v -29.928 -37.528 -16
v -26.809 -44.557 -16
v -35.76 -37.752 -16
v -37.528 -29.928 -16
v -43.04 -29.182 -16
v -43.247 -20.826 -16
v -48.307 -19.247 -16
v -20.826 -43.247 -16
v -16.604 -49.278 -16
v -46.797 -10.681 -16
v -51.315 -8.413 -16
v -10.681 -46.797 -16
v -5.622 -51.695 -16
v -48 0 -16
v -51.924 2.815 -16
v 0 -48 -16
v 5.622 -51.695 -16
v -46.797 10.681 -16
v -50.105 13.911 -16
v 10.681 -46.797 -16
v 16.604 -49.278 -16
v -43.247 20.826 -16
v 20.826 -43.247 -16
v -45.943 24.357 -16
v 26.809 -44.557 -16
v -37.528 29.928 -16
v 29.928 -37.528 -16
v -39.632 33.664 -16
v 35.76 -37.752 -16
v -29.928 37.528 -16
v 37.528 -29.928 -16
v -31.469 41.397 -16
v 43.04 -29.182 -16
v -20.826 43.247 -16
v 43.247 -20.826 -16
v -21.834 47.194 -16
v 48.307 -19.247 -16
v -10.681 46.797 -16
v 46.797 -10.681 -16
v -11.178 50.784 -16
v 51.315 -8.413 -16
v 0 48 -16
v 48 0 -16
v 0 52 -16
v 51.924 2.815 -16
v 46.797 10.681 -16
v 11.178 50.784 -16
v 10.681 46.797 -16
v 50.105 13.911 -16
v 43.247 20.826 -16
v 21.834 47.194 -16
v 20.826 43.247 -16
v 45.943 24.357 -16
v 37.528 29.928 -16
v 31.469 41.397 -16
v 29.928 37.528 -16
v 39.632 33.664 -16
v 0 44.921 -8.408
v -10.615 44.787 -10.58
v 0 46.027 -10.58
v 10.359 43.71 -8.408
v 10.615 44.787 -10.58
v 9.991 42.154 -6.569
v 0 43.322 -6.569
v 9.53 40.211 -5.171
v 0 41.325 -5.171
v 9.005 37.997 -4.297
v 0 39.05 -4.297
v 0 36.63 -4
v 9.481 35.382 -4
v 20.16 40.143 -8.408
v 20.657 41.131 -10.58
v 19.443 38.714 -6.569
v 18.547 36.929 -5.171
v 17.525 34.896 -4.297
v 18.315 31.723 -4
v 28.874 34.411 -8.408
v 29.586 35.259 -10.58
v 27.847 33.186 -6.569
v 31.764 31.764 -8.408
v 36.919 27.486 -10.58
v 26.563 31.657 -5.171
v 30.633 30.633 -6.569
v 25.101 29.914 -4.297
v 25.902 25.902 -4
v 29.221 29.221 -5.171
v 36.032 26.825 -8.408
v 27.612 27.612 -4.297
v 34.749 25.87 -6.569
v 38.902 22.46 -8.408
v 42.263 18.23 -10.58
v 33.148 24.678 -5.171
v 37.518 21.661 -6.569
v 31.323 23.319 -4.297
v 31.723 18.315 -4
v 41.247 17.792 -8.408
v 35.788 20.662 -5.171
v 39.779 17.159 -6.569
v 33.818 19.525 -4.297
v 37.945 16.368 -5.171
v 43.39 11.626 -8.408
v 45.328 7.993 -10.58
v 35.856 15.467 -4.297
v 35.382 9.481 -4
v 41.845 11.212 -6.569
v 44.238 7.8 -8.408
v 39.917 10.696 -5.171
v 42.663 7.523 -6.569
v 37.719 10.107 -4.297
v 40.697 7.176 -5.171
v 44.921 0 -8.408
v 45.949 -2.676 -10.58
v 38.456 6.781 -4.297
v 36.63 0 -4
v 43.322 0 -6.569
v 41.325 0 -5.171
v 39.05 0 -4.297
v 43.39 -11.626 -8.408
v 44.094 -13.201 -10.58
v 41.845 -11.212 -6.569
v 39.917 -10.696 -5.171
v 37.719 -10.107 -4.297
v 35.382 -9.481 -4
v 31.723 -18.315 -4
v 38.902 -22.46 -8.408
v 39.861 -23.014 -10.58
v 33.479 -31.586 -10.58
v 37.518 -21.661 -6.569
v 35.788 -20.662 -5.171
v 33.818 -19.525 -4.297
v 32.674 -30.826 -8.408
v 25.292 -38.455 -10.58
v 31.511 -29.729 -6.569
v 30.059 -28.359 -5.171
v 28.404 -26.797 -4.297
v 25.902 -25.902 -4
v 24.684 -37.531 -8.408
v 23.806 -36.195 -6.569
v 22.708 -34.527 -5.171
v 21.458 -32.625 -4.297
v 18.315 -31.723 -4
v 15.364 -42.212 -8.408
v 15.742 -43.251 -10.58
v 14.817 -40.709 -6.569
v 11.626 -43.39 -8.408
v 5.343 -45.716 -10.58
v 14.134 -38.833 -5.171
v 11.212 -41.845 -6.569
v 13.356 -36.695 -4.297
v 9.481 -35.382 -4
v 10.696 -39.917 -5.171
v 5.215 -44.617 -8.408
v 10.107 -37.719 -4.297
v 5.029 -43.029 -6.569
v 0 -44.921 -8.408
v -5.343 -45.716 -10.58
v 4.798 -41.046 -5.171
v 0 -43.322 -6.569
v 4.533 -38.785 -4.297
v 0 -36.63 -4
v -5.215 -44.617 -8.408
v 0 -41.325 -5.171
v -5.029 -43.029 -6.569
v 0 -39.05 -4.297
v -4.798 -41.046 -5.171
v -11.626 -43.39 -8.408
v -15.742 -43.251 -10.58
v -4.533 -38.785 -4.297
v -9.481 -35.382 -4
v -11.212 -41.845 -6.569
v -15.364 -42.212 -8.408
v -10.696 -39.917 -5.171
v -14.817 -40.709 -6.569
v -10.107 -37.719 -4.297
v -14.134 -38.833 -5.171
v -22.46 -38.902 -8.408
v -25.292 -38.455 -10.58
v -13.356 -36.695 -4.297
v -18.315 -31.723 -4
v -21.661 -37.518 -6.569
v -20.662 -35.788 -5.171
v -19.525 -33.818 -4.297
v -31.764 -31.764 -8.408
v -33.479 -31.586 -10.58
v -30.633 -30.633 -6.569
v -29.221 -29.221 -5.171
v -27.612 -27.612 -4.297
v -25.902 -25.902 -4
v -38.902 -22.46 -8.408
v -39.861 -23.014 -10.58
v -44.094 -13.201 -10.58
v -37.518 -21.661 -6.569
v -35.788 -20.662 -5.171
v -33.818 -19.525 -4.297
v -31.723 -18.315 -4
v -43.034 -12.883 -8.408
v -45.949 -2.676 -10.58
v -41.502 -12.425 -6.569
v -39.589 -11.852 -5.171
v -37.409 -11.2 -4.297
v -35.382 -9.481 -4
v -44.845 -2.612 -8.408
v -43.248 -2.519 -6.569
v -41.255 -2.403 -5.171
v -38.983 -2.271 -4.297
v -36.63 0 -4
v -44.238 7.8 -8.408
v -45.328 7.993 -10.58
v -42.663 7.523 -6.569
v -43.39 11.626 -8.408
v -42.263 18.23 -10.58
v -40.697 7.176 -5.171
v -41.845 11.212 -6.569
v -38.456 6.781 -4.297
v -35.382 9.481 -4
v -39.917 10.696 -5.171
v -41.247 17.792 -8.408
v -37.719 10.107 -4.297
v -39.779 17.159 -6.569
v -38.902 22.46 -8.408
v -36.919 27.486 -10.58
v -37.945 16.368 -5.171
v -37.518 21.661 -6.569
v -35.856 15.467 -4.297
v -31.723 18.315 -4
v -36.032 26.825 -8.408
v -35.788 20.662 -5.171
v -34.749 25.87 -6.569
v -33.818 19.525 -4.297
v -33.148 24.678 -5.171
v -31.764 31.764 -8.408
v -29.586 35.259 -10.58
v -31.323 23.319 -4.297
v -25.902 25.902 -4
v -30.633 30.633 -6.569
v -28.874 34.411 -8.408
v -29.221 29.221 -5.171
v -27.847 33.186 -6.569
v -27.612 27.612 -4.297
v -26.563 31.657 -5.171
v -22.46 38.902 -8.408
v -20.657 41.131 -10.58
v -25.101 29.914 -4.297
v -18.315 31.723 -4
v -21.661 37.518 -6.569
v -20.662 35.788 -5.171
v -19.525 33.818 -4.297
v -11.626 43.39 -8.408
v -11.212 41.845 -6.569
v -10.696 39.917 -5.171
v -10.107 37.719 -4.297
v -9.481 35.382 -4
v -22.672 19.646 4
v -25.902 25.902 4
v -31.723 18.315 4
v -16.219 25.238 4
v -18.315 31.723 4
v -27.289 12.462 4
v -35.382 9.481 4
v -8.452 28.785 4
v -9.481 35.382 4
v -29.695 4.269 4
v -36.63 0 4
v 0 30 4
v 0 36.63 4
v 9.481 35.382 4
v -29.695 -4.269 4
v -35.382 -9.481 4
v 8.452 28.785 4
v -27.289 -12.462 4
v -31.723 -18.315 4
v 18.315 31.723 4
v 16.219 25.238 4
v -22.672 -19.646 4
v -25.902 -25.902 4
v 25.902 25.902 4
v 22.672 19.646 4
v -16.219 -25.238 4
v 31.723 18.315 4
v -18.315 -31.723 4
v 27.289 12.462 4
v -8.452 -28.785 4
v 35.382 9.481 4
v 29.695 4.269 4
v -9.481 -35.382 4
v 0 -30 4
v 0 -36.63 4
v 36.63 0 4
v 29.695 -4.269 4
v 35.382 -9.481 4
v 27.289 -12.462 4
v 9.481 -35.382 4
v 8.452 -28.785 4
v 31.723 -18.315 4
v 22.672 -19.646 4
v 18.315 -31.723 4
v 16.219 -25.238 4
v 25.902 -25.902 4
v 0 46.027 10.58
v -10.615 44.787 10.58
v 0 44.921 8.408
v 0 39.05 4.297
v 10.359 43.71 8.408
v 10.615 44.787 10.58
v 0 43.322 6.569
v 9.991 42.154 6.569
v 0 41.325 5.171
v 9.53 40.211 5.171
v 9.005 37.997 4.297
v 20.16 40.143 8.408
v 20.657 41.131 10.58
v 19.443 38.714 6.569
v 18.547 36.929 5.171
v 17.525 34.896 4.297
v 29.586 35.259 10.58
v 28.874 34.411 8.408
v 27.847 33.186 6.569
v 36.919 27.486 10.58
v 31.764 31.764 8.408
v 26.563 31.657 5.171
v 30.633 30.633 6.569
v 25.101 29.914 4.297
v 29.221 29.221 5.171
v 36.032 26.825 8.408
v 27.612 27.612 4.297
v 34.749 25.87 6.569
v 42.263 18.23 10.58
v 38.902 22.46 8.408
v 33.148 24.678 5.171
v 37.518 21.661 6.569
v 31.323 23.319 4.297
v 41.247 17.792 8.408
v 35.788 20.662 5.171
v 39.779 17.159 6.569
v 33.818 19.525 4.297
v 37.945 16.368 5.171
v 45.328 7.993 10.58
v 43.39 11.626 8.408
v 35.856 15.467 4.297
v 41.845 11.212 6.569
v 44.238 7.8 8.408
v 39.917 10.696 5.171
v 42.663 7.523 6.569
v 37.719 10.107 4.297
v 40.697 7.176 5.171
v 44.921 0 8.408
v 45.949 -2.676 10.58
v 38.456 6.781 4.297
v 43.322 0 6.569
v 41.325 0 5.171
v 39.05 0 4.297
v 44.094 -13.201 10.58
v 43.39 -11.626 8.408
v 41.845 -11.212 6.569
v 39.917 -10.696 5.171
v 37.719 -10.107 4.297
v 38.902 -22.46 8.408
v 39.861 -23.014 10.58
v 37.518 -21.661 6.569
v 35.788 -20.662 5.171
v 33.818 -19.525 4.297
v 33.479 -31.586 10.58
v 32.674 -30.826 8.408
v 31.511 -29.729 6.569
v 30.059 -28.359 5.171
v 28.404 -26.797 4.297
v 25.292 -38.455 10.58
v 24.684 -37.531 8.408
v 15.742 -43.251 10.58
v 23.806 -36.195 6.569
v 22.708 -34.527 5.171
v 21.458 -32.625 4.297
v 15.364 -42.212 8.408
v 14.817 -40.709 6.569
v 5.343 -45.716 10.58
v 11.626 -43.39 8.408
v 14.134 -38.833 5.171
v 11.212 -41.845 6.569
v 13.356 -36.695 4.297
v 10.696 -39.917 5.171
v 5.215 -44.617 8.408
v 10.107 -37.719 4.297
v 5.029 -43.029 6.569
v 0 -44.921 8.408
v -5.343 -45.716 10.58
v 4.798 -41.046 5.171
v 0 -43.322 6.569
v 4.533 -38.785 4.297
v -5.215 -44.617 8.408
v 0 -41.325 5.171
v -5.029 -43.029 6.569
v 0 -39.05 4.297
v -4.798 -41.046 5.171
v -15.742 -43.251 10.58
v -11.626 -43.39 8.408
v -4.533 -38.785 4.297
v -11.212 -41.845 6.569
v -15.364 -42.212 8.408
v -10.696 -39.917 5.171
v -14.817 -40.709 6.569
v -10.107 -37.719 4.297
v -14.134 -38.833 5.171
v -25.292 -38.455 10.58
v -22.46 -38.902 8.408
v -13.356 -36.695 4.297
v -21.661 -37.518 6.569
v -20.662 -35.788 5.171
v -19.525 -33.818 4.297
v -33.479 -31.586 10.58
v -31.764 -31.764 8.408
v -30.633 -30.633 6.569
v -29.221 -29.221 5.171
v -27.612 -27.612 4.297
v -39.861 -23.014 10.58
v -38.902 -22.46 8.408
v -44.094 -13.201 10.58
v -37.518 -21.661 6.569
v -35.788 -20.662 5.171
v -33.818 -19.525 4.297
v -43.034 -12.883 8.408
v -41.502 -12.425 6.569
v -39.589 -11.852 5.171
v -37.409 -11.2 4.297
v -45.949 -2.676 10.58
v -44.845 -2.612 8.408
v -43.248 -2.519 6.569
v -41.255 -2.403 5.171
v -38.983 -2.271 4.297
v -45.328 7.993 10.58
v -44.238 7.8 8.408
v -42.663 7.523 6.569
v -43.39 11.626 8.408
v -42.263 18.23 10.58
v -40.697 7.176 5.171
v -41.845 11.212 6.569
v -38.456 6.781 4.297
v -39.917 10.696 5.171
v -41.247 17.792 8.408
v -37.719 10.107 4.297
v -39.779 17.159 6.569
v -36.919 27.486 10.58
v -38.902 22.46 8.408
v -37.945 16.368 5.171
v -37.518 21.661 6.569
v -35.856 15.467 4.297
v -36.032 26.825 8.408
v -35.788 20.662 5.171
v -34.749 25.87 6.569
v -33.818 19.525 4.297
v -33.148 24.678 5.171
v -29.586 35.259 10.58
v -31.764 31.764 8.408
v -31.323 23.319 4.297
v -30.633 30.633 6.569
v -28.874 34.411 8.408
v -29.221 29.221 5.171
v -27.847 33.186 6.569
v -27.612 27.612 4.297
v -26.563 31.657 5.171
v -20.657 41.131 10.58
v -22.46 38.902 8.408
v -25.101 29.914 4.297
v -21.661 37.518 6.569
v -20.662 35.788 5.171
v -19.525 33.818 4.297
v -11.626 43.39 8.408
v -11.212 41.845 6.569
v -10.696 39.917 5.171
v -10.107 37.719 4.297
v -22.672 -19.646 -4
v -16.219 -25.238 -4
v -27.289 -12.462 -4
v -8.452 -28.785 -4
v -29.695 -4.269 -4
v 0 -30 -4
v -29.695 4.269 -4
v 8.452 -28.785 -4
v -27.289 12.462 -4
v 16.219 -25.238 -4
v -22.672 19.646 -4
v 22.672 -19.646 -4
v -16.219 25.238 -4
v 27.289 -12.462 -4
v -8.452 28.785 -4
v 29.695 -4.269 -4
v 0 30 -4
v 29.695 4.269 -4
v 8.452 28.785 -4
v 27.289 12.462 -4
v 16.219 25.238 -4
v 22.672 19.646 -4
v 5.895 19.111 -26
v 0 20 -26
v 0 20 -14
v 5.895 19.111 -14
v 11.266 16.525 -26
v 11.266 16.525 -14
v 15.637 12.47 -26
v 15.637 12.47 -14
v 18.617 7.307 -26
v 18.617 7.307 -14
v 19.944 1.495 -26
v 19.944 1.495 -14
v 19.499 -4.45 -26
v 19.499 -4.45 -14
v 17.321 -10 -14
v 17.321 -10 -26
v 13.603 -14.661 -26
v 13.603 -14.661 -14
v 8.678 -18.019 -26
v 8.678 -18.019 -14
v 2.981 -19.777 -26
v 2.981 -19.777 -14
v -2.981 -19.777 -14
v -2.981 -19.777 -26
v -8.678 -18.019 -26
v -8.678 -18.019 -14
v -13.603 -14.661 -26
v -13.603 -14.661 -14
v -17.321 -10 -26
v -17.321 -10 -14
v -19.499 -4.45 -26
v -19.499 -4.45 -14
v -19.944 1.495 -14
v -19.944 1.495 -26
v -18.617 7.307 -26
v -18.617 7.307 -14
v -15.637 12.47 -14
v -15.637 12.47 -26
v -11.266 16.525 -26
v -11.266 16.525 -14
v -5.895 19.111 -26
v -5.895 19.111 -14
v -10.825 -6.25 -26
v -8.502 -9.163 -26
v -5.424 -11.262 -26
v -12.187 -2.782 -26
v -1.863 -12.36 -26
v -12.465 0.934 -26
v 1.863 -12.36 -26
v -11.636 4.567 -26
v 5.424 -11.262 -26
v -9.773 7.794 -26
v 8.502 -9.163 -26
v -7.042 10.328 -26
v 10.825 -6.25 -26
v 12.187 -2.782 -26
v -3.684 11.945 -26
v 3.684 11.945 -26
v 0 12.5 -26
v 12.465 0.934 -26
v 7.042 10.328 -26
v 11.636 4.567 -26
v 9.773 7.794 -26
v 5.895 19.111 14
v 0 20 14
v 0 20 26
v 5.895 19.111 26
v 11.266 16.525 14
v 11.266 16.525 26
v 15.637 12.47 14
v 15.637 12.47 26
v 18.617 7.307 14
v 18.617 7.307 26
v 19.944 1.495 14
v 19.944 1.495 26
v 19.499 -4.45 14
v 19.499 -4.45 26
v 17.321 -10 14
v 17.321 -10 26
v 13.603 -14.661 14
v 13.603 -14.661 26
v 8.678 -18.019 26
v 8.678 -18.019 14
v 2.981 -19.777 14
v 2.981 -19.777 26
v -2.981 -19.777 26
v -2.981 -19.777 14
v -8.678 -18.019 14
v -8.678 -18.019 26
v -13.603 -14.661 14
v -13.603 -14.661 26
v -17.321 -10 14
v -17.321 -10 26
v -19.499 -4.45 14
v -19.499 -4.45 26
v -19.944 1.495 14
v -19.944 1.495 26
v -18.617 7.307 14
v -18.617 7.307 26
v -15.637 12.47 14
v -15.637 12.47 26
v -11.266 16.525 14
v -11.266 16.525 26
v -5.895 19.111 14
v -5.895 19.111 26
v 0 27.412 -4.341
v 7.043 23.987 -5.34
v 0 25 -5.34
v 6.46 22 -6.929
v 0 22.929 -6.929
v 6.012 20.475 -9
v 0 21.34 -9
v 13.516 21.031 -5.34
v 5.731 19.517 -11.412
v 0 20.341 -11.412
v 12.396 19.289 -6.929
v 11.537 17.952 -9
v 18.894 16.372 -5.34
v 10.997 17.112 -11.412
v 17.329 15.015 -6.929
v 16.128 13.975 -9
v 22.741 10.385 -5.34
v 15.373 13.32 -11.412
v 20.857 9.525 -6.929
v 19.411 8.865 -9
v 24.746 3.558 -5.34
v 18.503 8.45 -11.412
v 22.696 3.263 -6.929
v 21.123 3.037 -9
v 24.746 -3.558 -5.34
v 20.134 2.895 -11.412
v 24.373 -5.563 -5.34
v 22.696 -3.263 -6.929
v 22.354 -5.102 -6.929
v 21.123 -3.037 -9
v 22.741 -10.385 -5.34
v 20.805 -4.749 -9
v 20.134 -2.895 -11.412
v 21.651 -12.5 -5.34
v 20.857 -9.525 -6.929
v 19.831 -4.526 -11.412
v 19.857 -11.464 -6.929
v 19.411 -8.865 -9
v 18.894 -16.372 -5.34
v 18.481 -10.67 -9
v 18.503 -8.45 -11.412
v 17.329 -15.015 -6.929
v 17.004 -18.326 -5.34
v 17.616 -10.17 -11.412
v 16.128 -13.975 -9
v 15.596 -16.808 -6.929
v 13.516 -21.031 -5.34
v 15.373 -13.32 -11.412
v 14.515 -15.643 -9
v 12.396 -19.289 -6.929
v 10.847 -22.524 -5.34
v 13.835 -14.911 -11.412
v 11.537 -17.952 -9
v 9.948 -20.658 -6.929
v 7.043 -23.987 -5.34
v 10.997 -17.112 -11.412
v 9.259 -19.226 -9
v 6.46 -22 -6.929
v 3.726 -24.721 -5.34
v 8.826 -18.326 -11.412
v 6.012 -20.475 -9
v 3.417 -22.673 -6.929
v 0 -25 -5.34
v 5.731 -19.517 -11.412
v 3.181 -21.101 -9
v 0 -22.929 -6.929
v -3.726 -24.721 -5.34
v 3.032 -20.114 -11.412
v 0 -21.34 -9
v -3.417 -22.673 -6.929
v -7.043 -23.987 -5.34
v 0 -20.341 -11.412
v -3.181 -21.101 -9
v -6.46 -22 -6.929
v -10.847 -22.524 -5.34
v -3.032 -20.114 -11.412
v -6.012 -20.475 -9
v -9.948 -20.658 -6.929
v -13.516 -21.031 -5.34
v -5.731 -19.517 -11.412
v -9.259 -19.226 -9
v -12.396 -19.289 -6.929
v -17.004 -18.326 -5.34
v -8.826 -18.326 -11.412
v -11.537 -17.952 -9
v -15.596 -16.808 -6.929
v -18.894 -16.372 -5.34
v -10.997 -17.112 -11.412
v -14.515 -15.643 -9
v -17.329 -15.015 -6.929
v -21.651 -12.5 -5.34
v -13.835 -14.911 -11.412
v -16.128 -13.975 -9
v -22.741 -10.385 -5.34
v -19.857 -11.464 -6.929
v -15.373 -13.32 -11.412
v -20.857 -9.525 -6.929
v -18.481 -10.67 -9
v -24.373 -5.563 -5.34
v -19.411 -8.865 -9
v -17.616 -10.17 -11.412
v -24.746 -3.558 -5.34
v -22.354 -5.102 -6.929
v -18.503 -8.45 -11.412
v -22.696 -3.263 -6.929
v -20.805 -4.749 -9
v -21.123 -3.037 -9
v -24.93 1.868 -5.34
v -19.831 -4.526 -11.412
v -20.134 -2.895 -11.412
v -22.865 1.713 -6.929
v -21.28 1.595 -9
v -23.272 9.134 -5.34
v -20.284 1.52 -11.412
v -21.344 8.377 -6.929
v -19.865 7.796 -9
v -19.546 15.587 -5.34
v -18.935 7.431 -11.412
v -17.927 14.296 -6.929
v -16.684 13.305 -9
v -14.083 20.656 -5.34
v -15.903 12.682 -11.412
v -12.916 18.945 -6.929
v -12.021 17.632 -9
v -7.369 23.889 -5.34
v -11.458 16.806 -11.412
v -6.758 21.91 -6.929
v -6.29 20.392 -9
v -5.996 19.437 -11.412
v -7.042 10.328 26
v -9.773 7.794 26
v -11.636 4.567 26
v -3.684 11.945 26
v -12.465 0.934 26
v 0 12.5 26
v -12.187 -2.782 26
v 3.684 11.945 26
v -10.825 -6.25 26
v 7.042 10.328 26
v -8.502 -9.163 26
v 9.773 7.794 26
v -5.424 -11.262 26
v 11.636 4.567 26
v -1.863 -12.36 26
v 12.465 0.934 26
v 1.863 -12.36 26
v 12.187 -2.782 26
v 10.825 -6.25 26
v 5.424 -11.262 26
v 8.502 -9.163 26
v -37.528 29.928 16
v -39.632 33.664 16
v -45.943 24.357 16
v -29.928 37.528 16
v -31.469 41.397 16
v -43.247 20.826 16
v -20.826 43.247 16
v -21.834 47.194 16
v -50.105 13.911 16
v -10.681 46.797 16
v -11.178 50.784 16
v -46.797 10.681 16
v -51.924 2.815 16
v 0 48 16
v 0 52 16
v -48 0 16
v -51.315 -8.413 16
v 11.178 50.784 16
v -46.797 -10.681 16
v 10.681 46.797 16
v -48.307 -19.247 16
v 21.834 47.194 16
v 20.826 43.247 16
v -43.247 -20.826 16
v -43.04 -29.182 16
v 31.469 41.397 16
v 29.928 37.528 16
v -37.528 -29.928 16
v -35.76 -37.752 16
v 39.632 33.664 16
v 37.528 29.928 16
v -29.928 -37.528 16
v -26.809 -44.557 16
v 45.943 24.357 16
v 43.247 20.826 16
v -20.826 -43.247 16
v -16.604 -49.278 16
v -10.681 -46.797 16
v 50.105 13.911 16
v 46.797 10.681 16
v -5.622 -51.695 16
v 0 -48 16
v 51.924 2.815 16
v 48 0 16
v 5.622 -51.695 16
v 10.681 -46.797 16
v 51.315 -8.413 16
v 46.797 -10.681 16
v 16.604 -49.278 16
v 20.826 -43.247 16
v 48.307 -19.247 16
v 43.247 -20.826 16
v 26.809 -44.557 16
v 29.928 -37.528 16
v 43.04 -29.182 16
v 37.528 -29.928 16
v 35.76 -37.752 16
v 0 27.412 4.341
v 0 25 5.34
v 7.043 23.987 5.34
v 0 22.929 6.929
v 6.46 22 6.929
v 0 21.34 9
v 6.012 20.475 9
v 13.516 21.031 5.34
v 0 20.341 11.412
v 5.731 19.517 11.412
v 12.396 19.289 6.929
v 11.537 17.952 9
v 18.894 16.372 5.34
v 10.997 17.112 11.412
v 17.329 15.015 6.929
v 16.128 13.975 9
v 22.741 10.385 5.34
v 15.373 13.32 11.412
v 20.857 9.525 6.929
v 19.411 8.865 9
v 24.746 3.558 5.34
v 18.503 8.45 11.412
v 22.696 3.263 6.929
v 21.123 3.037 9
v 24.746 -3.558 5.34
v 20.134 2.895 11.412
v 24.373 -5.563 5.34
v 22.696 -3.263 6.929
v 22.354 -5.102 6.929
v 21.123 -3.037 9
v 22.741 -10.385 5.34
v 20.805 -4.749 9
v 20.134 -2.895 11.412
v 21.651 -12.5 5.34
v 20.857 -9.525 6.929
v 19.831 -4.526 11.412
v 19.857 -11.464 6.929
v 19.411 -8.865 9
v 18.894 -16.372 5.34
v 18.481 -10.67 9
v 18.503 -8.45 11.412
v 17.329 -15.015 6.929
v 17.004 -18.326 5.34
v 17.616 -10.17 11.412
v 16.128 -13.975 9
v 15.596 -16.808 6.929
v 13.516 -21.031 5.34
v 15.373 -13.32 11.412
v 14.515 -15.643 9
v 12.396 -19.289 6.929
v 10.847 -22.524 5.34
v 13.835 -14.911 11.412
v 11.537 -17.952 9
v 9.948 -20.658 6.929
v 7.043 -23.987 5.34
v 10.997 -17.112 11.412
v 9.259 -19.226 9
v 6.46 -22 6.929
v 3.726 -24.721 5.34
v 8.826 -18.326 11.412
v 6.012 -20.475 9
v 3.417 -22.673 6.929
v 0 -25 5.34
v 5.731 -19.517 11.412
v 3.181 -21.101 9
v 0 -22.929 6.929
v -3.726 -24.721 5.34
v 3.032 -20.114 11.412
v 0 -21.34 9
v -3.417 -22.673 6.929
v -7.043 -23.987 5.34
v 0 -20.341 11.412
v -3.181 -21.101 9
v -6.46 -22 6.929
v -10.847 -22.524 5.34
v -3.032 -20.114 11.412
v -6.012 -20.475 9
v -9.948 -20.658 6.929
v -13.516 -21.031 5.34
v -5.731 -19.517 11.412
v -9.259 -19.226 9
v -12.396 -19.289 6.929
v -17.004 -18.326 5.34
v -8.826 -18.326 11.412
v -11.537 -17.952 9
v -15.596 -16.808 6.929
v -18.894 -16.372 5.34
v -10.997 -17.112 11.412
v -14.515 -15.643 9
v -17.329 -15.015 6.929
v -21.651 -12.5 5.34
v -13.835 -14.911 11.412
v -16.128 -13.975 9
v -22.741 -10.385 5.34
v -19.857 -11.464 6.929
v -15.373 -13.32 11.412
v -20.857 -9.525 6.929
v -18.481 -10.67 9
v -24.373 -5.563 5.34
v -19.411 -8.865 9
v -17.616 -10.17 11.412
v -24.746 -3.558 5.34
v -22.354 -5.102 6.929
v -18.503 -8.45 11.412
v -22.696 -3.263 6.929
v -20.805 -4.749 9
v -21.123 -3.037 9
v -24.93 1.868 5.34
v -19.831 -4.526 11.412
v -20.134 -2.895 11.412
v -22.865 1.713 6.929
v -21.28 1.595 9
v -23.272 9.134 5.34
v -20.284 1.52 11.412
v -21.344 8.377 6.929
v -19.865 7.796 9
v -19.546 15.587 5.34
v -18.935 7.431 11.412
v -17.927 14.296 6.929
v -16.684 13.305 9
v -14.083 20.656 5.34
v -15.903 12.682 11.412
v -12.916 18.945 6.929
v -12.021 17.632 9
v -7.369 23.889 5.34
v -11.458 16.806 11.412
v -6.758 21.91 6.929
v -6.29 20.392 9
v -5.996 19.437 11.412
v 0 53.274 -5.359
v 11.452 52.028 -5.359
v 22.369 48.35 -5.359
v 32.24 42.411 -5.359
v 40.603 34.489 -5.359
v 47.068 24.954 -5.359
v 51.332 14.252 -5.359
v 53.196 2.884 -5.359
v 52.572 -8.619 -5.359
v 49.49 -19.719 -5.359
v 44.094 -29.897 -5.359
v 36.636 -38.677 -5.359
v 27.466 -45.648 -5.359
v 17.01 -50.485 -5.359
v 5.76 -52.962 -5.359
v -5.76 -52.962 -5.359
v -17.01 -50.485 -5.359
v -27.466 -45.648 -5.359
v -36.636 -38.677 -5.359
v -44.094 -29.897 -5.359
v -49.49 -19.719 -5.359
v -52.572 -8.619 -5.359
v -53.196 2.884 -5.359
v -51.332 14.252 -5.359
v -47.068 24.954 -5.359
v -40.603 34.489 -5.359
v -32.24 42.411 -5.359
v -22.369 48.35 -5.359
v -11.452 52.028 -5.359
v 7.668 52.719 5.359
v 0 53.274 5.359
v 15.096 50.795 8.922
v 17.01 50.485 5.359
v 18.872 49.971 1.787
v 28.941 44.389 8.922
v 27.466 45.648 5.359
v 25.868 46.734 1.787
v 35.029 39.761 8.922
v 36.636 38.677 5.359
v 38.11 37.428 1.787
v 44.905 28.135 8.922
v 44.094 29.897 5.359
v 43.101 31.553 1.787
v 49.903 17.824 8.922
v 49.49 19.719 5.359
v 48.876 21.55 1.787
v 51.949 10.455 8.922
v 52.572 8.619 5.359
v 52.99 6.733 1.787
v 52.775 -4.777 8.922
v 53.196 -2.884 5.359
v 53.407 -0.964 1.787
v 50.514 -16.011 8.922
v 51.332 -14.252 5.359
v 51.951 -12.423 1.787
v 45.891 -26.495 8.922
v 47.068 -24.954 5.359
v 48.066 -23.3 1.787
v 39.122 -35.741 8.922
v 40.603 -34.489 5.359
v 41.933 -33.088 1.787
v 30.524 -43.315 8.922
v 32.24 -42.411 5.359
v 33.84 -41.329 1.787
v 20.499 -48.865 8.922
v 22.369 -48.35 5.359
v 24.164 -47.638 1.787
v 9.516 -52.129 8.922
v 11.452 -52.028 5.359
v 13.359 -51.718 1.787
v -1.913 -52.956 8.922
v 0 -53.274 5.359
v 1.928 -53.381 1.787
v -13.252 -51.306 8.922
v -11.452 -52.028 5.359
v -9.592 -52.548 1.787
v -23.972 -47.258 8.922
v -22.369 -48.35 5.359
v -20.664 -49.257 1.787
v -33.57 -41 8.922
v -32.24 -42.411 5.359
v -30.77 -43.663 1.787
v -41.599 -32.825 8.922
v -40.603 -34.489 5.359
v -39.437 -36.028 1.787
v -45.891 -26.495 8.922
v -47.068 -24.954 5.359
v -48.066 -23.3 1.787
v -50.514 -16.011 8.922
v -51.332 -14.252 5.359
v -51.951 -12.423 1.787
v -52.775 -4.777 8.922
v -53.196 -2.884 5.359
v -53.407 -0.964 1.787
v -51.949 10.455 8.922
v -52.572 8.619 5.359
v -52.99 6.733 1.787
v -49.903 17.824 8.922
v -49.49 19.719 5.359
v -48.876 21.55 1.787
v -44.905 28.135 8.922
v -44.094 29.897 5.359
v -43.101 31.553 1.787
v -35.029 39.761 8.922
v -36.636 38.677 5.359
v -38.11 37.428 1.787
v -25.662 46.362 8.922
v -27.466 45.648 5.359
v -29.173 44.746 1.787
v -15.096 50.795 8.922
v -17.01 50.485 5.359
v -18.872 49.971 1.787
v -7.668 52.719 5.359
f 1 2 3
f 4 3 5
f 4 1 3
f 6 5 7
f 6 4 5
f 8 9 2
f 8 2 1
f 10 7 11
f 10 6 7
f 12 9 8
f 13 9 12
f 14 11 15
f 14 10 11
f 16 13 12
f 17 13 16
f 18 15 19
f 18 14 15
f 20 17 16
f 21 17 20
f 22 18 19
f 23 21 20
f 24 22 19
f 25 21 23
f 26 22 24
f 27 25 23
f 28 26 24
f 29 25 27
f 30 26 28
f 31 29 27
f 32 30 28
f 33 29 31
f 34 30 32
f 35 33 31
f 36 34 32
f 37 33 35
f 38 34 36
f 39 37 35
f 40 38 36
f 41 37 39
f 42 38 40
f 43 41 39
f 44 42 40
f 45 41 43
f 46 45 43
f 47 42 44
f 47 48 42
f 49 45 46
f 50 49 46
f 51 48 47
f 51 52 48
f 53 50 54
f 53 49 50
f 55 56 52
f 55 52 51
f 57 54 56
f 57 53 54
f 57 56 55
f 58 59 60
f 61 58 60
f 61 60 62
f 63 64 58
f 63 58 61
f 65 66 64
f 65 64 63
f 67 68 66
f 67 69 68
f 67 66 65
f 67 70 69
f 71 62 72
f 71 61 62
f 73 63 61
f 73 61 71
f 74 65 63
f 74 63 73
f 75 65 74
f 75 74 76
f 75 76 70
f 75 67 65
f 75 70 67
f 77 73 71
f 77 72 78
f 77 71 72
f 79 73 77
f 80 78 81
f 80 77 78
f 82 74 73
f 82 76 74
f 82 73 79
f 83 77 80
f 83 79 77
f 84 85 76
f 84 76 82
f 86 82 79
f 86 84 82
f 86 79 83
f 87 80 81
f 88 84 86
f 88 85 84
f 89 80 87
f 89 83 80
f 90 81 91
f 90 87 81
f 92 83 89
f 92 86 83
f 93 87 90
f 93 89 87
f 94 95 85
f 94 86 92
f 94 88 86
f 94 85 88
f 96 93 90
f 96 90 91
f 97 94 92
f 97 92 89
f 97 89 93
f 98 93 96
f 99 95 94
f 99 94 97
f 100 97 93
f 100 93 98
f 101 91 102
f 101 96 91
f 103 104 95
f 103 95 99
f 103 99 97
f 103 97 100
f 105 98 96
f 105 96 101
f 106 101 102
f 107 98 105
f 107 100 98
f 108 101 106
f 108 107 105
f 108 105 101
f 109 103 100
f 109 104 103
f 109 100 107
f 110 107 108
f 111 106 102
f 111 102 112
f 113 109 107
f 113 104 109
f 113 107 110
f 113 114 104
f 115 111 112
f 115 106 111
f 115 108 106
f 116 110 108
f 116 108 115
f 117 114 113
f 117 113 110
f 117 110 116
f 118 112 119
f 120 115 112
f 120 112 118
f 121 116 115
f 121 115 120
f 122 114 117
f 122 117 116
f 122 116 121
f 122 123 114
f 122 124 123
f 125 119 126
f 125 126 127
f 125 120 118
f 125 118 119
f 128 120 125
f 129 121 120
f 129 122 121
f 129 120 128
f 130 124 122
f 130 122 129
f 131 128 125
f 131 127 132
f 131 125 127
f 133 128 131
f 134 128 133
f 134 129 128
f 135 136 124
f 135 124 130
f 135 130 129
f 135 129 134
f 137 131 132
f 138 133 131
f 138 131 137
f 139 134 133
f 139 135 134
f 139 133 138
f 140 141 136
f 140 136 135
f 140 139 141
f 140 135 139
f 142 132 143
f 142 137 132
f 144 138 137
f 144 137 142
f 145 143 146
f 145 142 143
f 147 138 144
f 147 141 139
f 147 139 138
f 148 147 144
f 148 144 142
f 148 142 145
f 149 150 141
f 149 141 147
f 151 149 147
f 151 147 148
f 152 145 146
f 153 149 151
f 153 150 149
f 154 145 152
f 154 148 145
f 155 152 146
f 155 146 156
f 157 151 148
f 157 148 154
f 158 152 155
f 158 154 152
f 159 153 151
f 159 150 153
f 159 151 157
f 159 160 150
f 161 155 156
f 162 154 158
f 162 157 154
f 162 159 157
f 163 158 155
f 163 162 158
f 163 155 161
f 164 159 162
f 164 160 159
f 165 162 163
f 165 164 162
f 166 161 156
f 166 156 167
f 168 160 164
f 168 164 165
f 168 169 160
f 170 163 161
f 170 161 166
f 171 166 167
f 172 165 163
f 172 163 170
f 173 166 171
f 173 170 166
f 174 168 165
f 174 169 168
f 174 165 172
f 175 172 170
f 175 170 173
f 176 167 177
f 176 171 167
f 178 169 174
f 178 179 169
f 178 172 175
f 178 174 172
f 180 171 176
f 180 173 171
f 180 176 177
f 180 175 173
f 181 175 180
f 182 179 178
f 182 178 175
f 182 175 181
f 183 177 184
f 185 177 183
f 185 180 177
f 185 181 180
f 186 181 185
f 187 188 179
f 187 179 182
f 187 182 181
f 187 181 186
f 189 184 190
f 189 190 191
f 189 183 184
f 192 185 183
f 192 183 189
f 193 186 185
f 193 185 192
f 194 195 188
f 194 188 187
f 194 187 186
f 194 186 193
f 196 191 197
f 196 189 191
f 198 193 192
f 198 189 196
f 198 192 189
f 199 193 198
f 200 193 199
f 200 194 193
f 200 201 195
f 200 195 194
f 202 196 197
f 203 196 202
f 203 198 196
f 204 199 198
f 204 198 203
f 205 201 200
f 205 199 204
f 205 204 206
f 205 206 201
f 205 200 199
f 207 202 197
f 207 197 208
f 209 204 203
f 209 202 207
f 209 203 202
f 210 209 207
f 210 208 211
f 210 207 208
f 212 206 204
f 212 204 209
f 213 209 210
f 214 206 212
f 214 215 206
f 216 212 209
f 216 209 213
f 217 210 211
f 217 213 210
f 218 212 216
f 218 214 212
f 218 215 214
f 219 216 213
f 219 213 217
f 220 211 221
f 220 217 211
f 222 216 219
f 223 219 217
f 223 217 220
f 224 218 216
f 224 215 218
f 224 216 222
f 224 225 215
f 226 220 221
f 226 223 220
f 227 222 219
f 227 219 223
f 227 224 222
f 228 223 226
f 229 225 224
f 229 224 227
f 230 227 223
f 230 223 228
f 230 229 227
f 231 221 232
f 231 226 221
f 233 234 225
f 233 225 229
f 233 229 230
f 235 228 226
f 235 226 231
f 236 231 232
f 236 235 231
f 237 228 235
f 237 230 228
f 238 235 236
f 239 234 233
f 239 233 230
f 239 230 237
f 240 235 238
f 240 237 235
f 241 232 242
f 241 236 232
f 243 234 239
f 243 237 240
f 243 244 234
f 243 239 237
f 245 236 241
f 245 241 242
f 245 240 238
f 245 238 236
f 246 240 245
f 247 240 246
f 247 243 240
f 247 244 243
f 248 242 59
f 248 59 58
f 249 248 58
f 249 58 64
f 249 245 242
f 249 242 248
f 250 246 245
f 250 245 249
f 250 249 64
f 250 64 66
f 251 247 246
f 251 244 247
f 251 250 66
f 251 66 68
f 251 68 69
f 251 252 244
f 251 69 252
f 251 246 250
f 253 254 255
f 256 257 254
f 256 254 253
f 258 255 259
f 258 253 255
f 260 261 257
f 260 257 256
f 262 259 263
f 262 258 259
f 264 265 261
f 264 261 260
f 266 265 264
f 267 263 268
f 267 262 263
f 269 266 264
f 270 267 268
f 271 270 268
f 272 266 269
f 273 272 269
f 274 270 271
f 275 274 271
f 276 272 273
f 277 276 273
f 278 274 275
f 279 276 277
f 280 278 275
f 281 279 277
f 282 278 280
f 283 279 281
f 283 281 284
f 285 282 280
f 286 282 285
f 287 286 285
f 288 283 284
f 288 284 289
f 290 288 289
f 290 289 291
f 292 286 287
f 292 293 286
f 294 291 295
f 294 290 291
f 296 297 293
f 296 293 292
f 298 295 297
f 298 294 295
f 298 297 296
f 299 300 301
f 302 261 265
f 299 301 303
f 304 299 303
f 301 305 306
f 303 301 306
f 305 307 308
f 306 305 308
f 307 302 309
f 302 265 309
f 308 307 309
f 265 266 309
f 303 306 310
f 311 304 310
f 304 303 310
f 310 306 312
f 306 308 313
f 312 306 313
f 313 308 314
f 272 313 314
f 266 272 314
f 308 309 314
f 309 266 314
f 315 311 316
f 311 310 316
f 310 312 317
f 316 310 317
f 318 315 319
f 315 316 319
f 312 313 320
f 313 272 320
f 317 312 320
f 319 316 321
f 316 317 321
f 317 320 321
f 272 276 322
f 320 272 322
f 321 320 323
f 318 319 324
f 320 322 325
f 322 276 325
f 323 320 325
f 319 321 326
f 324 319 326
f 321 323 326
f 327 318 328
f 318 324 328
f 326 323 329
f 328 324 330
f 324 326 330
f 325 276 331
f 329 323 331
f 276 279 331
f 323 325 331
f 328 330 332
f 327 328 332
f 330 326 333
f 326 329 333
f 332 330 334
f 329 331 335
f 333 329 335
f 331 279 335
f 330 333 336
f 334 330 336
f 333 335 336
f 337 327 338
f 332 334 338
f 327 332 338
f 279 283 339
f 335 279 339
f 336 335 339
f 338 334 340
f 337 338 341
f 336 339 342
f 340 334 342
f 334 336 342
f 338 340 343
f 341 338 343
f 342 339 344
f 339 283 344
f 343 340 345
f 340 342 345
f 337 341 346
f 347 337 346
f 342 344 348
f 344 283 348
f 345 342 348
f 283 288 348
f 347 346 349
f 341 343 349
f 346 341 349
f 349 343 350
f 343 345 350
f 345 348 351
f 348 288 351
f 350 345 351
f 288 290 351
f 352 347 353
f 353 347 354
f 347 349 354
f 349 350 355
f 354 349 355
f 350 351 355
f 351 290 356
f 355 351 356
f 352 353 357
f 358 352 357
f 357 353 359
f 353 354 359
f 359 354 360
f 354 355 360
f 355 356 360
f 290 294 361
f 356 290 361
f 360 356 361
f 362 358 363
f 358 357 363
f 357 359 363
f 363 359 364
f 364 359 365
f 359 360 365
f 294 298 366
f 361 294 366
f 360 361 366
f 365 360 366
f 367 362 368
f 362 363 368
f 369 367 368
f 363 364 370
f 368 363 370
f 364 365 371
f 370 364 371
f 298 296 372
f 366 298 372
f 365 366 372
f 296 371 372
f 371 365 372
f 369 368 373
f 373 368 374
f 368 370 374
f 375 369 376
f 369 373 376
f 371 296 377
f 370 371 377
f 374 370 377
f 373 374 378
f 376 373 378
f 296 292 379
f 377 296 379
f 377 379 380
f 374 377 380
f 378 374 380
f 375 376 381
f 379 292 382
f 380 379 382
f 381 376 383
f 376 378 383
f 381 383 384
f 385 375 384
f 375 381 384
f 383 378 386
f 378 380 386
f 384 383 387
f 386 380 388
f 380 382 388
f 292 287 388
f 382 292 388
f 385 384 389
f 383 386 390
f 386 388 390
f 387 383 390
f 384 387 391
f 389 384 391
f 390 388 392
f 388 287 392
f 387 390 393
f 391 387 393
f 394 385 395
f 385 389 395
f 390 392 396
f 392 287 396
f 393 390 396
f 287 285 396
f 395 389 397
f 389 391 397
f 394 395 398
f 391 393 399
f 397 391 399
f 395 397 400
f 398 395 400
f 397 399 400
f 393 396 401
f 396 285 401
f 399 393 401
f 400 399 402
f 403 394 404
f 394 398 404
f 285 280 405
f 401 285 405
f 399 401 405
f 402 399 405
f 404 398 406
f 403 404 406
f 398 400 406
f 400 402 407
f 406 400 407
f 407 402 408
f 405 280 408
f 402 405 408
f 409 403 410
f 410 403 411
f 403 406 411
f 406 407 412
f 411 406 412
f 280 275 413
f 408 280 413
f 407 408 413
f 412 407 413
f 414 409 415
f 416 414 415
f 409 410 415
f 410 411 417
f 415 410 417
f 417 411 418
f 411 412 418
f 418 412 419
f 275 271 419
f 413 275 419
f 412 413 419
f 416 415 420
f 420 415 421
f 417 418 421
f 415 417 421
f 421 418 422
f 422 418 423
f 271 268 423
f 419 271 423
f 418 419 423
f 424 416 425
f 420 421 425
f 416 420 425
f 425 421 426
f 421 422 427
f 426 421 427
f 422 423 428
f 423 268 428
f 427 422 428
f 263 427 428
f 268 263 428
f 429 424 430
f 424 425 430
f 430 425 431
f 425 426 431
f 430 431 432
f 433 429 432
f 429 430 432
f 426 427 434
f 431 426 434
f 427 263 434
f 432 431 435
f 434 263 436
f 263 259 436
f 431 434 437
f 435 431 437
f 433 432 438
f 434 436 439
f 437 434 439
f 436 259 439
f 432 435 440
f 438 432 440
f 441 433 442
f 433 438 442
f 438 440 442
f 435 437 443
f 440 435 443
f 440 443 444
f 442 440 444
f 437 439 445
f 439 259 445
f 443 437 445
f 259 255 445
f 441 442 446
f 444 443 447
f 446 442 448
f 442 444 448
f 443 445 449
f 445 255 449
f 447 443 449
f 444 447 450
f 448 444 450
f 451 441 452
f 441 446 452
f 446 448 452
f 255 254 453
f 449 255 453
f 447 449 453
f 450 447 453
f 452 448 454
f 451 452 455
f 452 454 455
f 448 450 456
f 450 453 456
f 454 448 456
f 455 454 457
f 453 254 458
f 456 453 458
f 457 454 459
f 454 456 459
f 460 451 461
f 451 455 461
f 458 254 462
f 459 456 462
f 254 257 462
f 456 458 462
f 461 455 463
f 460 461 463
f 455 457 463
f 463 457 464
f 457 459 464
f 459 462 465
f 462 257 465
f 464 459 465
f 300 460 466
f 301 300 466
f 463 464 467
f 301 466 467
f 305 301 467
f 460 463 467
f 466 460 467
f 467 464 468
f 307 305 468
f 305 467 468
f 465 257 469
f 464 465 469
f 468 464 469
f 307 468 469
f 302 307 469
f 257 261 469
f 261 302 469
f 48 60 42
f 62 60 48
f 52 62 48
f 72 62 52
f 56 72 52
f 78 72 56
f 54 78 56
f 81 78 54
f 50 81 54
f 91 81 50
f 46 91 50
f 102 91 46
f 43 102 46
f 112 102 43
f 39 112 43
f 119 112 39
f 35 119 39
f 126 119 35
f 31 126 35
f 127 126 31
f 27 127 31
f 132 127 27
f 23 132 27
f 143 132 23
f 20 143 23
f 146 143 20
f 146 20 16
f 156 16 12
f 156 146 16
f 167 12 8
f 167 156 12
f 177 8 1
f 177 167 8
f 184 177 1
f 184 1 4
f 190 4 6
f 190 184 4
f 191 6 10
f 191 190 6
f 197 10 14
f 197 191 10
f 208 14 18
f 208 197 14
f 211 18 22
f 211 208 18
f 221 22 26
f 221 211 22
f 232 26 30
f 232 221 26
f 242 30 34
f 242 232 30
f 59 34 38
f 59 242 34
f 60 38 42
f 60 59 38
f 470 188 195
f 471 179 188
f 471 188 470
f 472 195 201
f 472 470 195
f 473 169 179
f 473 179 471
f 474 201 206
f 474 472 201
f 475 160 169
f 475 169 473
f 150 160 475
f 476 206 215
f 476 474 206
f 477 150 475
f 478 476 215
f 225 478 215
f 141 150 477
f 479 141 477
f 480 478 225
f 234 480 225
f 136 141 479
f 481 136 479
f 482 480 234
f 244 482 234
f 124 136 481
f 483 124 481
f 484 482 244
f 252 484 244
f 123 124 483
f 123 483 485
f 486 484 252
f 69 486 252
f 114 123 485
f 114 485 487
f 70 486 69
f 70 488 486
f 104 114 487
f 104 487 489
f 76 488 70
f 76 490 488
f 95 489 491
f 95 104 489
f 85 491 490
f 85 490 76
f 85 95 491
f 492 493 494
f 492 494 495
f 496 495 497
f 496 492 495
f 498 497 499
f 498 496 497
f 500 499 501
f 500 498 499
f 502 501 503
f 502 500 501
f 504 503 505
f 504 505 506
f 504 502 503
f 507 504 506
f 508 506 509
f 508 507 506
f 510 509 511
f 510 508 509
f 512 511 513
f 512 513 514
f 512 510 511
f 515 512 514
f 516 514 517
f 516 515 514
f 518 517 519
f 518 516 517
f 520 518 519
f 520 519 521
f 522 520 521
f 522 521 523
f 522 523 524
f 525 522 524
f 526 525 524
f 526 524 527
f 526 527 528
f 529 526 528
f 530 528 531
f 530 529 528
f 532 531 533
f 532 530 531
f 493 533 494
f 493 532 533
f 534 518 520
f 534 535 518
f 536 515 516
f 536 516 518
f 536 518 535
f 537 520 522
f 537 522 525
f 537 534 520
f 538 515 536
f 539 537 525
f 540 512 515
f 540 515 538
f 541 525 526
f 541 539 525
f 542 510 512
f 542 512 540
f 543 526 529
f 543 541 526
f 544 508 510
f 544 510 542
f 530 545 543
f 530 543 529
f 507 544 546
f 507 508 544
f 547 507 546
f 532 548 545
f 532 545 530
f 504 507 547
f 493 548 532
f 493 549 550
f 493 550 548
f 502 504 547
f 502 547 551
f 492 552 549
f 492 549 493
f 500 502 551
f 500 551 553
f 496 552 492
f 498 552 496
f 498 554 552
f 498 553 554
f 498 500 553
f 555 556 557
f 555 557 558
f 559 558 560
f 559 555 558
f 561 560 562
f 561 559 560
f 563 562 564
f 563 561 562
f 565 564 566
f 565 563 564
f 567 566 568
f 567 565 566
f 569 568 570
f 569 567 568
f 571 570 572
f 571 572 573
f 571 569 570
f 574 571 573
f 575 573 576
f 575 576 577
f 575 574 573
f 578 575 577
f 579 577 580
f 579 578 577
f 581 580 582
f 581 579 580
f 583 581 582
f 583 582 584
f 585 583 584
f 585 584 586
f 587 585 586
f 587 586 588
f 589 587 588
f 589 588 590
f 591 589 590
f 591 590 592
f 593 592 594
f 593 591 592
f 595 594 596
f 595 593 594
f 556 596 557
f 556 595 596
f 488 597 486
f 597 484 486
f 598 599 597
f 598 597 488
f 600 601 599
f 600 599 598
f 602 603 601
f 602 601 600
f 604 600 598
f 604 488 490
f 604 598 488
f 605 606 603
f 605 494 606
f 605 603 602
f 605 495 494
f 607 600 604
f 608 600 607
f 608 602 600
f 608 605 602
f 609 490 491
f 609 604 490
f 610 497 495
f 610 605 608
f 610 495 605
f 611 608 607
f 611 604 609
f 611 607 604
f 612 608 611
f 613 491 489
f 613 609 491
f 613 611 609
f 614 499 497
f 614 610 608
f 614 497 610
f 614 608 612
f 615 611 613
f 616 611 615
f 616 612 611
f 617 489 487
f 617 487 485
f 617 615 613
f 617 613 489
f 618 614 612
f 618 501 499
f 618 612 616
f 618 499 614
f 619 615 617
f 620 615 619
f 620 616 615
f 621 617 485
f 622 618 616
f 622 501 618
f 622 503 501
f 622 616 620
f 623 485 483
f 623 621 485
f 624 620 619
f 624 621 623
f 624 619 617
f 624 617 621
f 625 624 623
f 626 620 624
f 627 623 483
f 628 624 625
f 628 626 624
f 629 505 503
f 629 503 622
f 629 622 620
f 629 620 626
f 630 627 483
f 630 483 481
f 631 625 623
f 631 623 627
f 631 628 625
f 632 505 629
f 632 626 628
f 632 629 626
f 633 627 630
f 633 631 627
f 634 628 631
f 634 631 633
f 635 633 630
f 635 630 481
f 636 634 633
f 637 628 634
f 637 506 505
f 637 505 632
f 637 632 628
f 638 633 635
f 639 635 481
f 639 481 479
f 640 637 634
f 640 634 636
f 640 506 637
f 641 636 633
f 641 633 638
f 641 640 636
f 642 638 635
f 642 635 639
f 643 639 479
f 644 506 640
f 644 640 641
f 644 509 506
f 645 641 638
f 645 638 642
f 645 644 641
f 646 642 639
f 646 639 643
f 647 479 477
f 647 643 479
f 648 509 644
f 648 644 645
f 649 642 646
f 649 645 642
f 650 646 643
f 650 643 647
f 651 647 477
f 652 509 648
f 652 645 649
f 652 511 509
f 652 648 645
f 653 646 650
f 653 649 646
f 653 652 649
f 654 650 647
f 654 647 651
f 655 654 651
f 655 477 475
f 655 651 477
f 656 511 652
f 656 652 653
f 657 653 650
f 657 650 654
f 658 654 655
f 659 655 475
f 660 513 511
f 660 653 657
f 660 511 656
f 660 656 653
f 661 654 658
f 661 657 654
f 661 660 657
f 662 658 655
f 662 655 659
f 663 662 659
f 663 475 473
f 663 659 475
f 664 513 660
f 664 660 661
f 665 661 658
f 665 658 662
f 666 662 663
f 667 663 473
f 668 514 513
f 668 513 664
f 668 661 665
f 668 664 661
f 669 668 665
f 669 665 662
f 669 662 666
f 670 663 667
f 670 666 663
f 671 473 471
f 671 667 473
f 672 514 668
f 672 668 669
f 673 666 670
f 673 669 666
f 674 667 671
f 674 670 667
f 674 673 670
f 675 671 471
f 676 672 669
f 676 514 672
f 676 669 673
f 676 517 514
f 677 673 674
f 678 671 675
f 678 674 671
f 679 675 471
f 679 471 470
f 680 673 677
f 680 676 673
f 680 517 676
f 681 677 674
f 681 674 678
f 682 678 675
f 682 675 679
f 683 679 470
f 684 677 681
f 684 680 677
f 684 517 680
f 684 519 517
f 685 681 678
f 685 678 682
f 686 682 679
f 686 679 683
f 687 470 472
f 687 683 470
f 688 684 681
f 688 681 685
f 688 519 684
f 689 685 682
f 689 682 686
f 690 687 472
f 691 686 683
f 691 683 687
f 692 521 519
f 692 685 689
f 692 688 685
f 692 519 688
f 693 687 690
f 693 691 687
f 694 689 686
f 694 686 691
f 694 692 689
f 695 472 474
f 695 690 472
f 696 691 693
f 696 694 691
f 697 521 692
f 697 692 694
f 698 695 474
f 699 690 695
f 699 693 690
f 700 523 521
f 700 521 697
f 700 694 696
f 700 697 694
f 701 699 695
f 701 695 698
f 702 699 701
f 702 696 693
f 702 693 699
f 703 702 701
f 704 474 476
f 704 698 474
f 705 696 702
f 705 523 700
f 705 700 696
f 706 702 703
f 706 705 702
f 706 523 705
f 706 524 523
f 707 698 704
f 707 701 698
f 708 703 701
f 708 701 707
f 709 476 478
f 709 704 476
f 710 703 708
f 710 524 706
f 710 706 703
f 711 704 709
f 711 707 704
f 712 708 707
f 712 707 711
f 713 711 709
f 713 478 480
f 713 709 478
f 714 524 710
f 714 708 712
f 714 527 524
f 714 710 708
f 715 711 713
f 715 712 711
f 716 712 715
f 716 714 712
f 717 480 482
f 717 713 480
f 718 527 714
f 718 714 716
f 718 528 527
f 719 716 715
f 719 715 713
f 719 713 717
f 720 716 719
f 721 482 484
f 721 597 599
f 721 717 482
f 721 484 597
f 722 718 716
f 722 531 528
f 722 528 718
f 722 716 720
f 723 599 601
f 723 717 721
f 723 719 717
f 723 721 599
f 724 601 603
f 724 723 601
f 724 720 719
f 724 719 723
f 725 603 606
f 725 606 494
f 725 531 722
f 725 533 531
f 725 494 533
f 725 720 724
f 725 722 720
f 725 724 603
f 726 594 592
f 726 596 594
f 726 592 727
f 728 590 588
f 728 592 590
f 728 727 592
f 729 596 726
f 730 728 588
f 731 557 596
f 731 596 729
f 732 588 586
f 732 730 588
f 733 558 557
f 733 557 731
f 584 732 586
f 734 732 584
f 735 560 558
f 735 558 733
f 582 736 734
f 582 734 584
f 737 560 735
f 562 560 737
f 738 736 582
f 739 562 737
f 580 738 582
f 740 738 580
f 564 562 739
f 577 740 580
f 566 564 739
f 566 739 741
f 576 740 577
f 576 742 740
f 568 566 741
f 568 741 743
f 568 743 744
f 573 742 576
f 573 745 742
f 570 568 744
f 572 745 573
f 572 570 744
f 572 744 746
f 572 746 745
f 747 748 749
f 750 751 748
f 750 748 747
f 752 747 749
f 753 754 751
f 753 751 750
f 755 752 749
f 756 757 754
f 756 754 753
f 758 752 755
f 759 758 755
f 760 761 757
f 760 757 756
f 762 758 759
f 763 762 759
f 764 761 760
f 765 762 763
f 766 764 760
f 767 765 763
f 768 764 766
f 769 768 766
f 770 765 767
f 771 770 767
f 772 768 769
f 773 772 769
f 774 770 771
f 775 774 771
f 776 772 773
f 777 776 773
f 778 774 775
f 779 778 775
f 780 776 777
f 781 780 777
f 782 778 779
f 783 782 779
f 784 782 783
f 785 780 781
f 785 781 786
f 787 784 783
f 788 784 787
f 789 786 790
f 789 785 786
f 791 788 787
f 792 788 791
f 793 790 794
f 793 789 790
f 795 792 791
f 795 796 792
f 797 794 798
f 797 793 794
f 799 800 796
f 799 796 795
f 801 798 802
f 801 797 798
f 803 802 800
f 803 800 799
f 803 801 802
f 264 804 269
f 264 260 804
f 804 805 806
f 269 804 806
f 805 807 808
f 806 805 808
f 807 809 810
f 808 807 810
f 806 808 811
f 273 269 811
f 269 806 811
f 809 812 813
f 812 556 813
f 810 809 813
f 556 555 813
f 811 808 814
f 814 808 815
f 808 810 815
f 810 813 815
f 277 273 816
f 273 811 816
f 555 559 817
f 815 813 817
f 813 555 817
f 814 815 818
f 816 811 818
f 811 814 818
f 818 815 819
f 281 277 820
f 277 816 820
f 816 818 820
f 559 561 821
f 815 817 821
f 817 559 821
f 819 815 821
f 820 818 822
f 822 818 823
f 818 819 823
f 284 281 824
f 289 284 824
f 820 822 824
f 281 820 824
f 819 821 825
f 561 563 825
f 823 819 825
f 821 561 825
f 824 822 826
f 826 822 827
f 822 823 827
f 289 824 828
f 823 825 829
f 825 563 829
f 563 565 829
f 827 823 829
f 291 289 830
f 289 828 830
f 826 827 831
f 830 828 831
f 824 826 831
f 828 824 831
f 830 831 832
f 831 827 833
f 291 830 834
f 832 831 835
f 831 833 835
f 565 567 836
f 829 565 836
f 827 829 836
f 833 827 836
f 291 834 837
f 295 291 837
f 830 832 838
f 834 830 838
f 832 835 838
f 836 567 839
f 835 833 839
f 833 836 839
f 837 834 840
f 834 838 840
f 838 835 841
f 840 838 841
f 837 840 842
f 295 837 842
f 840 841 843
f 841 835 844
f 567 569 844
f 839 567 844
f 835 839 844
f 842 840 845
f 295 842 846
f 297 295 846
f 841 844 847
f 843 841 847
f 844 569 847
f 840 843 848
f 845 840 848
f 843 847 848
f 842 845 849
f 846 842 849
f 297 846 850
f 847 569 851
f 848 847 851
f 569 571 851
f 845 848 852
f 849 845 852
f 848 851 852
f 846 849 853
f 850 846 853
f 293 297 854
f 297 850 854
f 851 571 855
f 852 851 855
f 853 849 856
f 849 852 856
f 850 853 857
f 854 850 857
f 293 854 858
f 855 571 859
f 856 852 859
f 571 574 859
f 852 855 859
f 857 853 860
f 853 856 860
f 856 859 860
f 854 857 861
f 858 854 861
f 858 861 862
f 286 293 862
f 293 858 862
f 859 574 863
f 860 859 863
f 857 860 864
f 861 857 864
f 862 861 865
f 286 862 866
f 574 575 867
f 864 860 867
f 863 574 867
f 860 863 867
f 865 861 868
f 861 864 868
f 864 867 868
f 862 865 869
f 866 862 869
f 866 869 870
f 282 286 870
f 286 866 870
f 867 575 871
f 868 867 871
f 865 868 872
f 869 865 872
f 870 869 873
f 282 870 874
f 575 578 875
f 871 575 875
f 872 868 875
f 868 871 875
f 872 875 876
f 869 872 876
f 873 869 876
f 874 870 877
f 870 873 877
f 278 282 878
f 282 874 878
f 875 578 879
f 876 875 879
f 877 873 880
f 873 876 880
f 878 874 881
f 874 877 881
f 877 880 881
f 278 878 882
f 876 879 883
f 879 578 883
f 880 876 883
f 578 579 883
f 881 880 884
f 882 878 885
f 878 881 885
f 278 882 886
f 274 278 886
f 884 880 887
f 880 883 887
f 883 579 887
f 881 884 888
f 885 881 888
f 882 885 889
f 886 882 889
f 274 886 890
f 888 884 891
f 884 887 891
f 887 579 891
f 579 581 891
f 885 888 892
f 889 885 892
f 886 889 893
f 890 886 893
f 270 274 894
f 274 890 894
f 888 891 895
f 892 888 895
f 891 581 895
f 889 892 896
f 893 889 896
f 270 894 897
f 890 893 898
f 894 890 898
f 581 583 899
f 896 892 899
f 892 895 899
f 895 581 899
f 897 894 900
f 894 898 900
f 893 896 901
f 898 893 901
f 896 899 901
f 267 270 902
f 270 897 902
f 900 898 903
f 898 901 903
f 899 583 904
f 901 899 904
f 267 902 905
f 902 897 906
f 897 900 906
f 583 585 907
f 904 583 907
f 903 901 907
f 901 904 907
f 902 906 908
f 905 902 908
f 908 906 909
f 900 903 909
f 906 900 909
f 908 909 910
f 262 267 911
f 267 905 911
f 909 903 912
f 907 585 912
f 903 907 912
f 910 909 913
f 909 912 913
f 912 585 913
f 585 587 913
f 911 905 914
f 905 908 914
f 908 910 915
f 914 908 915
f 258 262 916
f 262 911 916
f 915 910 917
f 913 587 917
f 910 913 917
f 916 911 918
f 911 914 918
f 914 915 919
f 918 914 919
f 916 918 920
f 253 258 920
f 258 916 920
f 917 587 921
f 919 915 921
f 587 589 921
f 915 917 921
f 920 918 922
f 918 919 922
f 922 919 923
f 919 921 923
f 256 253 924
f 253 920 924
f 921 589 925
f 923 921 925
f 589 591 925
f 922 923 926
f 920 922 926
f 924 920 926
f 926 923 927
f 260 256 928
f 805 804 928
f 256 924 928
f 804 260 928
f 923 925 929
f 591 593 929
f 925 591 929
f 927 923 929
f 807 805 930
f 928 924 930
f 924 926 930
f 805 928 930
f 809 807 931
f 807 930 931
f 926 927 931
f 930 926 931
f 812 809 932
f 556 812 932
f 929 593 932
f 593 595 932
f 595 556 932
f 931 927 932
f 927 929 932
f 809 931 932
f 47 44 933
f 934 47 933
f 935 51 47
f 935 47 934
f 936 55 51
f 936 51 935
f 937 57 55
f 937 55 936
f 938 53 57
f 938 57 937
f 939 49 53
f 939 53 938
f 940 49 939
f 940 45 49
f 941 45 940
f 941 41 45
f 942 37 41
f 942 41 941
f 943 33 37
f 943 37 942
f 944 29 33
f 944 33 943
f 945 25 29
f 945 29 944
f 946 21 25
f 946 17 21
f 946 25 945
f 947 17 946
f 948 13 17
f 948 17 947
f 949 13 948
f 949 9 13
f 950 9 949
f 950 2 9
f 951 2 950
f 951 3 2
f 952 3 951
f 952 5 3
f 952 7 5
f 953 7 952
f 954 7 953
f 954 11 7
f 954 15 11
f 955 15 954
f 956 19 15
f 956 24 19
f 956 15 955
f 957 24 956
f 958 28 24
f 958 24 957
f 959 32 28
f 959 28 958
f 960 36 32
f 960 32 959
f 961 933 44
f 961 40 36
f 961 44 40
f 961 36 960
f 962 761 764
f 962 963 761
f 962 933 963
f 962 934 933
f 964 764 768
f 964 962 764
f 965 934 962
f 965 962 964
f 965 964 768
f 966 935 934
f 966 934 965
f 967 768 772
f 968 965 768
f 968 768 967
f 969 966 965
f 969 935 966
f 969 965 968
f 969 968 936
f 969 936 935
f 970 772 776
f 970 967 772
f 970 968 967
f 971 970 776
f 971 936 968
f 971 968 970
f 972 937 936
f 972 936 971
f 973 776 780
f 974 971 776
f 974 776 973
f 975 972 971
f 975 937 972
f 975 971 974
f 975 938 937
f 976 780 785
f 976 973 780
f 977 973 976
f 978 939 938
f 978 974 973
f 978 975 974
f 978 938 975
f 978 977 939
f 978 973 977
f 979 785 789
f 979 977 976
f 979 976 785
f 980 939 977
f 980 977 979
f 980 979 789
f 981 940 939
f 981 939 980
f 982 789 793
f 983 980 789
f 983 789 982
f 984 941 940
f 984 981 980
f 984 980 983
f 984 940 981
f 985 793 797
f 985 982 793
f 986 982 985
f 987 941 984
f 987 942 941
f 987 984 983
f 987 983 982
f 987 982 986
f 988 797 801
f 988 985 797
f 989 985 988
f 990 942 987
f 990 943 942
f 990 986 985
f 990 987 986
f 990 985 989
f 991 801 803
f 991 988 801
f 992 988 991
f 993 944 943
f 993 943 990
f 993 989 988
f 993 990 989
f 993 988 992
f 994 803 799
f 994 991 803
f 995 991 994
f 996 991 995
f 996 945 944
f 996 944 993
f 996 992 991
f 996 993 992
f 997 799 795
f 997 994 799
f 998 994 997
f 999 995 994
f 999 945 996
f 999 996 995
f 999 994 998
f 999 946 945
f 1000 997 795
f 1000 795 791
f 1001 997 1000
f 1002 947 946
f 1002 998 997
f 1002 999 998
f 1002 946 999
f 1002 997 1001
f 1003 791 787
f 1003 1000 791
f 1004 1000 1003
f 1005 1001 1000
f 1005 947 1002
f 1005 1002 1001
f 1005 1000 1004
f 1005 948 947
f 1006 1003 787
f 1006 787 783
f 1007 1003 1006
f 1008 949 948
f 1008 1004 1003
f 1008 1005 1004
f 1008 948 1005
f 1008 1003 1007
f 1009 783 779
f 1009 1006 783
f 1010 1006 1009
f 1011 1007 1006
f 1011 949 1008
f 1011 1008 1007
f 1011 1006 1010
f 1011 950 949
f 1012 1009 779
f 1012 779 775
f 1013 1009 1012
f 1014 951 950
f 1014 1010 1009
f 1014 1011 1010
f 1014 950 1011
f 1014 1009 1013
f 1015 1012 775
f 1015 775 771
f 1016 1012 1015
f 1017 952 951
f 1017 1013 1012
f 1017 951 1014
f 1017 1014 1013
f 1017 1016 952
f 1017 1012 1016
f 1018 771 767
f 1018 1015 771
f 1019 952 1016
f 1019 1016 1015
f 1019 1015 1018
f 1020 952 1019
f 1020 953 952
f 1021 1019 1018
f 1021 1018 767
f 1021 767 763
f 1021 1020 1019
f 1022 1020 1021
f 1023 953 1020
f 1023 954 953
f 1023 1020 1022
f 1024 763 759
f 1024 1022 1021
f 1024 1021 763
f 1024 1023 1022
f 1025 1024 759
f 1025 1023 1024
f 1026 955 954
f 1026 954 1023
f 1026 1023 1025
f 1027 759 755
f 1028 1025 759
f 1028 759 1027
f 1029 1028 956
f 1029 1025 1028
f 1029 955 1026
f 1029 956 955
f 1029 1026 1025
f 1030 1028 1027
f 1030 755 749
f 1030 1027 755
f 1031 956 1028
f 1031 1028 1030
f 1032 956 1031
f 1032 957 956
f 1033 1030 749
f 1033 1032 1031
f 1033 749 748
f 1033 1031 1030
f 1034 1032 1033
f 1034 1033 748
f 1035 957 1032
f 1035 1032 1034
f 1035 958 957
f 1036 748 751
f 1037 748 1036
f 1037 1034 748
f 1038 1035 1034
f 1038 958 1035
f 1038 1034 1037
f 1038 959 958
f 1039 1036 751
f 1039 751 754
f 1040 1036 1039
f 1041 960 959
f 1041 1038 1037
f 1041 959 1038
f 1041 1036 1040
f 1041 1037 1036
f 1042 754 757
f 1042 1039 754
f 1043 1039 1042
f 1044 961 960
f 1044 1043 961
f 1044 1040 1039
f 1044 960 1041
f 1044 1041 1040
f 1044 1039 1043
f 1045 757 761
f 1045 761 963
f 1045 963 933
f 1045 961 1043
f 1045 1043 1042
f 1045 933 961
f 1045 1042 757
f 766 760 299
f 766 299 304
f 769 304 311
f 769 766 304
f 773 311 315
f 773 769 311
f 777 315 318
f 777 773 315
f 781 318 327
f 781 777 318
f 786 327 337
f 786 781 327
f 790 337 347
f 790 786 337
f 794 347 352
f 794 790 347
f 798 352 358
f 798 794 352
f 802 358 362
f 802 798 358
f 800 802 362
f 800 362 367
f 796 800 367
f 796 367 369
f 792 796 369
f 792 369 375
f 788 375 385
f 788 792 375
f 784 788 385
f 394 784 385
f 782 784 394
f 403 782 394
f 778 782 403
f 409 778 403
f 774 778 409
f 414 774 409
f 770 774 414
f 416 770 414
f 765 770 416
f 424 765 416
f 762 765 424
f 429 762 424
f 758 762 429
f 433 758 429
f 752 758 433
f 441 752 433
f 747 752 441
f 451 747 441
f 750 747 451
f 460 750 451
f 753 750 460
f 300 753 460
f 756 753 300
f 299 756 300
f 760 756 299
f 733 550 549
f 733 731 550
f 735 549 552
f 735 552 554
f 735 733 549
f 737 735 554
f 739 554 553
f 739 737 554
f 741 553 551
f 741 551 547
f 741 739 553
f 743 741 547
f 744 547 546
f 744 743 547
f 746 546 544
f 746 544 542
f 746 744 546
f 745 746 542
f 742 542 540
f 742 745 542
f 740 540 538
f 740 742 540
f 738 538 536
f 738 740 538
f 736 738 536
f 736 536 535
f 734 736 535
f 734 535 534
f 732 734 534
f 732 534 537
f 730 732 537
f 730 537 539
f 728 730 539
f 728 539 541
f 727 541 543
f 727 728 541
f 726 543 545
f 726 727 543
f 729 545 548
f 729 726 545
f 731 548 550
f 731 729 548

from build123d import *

# Parameters (mm, degrees)
RACCORDO1_R = 10
RACCORDO2_R = 10


with BuildPart() as part:
    # Schizzo1 → Rivoluzione1 (revolve)
    with BuildSketch(Plane(origin=(0, 0, 0), x_dir=(0, 0, -1), z_dir=(1, 0, 0))):
        with BuildLine():
            Line((26, 12.5), (-26, 12.5))
            Line((-26, 12.5), (-26, 20))
            Line((-26, 20), (-4, 20))
            Line((-4, 20), (-4, 43.632357189))
            Line((-4, 43.632357189), (-16, 48))
            Line((-16, 48), (-16, 52))
            ThreePointArc((-16, 52), (0, 53.433640698), (16, 52))
            Line((16, 52), (16, 48))
            Line((16, 48), (4, 43.632357189))
            Line((4, 43.632357189), (4, 20))
            Line((4, 20), (26, 20))
            Line((26, 20), (26, 12.5))
        make_face()
    revolve(axis=Axis((0, 0, 0), (0, 0, -1)))

    # Raccordo1
    raccordo1_edges = [part.edges().sort_by_distance(p)[0] for p in [
        (0, -43.632357189, -4),
        (0, -20, -4),
    ]]
    fillet(raccordo1_edges, radius=RACCORDO1_R)

    # Raccordo2
    raccordo2_edges = [part.edges().sort_by_distance(p)[0] for p in [
        (0, -43.632357189, 4),
        (0, -20, 4),
    ]]
    fillet(raccordo2_edges, radius=RACCORDO2_R)


solid = part.part
